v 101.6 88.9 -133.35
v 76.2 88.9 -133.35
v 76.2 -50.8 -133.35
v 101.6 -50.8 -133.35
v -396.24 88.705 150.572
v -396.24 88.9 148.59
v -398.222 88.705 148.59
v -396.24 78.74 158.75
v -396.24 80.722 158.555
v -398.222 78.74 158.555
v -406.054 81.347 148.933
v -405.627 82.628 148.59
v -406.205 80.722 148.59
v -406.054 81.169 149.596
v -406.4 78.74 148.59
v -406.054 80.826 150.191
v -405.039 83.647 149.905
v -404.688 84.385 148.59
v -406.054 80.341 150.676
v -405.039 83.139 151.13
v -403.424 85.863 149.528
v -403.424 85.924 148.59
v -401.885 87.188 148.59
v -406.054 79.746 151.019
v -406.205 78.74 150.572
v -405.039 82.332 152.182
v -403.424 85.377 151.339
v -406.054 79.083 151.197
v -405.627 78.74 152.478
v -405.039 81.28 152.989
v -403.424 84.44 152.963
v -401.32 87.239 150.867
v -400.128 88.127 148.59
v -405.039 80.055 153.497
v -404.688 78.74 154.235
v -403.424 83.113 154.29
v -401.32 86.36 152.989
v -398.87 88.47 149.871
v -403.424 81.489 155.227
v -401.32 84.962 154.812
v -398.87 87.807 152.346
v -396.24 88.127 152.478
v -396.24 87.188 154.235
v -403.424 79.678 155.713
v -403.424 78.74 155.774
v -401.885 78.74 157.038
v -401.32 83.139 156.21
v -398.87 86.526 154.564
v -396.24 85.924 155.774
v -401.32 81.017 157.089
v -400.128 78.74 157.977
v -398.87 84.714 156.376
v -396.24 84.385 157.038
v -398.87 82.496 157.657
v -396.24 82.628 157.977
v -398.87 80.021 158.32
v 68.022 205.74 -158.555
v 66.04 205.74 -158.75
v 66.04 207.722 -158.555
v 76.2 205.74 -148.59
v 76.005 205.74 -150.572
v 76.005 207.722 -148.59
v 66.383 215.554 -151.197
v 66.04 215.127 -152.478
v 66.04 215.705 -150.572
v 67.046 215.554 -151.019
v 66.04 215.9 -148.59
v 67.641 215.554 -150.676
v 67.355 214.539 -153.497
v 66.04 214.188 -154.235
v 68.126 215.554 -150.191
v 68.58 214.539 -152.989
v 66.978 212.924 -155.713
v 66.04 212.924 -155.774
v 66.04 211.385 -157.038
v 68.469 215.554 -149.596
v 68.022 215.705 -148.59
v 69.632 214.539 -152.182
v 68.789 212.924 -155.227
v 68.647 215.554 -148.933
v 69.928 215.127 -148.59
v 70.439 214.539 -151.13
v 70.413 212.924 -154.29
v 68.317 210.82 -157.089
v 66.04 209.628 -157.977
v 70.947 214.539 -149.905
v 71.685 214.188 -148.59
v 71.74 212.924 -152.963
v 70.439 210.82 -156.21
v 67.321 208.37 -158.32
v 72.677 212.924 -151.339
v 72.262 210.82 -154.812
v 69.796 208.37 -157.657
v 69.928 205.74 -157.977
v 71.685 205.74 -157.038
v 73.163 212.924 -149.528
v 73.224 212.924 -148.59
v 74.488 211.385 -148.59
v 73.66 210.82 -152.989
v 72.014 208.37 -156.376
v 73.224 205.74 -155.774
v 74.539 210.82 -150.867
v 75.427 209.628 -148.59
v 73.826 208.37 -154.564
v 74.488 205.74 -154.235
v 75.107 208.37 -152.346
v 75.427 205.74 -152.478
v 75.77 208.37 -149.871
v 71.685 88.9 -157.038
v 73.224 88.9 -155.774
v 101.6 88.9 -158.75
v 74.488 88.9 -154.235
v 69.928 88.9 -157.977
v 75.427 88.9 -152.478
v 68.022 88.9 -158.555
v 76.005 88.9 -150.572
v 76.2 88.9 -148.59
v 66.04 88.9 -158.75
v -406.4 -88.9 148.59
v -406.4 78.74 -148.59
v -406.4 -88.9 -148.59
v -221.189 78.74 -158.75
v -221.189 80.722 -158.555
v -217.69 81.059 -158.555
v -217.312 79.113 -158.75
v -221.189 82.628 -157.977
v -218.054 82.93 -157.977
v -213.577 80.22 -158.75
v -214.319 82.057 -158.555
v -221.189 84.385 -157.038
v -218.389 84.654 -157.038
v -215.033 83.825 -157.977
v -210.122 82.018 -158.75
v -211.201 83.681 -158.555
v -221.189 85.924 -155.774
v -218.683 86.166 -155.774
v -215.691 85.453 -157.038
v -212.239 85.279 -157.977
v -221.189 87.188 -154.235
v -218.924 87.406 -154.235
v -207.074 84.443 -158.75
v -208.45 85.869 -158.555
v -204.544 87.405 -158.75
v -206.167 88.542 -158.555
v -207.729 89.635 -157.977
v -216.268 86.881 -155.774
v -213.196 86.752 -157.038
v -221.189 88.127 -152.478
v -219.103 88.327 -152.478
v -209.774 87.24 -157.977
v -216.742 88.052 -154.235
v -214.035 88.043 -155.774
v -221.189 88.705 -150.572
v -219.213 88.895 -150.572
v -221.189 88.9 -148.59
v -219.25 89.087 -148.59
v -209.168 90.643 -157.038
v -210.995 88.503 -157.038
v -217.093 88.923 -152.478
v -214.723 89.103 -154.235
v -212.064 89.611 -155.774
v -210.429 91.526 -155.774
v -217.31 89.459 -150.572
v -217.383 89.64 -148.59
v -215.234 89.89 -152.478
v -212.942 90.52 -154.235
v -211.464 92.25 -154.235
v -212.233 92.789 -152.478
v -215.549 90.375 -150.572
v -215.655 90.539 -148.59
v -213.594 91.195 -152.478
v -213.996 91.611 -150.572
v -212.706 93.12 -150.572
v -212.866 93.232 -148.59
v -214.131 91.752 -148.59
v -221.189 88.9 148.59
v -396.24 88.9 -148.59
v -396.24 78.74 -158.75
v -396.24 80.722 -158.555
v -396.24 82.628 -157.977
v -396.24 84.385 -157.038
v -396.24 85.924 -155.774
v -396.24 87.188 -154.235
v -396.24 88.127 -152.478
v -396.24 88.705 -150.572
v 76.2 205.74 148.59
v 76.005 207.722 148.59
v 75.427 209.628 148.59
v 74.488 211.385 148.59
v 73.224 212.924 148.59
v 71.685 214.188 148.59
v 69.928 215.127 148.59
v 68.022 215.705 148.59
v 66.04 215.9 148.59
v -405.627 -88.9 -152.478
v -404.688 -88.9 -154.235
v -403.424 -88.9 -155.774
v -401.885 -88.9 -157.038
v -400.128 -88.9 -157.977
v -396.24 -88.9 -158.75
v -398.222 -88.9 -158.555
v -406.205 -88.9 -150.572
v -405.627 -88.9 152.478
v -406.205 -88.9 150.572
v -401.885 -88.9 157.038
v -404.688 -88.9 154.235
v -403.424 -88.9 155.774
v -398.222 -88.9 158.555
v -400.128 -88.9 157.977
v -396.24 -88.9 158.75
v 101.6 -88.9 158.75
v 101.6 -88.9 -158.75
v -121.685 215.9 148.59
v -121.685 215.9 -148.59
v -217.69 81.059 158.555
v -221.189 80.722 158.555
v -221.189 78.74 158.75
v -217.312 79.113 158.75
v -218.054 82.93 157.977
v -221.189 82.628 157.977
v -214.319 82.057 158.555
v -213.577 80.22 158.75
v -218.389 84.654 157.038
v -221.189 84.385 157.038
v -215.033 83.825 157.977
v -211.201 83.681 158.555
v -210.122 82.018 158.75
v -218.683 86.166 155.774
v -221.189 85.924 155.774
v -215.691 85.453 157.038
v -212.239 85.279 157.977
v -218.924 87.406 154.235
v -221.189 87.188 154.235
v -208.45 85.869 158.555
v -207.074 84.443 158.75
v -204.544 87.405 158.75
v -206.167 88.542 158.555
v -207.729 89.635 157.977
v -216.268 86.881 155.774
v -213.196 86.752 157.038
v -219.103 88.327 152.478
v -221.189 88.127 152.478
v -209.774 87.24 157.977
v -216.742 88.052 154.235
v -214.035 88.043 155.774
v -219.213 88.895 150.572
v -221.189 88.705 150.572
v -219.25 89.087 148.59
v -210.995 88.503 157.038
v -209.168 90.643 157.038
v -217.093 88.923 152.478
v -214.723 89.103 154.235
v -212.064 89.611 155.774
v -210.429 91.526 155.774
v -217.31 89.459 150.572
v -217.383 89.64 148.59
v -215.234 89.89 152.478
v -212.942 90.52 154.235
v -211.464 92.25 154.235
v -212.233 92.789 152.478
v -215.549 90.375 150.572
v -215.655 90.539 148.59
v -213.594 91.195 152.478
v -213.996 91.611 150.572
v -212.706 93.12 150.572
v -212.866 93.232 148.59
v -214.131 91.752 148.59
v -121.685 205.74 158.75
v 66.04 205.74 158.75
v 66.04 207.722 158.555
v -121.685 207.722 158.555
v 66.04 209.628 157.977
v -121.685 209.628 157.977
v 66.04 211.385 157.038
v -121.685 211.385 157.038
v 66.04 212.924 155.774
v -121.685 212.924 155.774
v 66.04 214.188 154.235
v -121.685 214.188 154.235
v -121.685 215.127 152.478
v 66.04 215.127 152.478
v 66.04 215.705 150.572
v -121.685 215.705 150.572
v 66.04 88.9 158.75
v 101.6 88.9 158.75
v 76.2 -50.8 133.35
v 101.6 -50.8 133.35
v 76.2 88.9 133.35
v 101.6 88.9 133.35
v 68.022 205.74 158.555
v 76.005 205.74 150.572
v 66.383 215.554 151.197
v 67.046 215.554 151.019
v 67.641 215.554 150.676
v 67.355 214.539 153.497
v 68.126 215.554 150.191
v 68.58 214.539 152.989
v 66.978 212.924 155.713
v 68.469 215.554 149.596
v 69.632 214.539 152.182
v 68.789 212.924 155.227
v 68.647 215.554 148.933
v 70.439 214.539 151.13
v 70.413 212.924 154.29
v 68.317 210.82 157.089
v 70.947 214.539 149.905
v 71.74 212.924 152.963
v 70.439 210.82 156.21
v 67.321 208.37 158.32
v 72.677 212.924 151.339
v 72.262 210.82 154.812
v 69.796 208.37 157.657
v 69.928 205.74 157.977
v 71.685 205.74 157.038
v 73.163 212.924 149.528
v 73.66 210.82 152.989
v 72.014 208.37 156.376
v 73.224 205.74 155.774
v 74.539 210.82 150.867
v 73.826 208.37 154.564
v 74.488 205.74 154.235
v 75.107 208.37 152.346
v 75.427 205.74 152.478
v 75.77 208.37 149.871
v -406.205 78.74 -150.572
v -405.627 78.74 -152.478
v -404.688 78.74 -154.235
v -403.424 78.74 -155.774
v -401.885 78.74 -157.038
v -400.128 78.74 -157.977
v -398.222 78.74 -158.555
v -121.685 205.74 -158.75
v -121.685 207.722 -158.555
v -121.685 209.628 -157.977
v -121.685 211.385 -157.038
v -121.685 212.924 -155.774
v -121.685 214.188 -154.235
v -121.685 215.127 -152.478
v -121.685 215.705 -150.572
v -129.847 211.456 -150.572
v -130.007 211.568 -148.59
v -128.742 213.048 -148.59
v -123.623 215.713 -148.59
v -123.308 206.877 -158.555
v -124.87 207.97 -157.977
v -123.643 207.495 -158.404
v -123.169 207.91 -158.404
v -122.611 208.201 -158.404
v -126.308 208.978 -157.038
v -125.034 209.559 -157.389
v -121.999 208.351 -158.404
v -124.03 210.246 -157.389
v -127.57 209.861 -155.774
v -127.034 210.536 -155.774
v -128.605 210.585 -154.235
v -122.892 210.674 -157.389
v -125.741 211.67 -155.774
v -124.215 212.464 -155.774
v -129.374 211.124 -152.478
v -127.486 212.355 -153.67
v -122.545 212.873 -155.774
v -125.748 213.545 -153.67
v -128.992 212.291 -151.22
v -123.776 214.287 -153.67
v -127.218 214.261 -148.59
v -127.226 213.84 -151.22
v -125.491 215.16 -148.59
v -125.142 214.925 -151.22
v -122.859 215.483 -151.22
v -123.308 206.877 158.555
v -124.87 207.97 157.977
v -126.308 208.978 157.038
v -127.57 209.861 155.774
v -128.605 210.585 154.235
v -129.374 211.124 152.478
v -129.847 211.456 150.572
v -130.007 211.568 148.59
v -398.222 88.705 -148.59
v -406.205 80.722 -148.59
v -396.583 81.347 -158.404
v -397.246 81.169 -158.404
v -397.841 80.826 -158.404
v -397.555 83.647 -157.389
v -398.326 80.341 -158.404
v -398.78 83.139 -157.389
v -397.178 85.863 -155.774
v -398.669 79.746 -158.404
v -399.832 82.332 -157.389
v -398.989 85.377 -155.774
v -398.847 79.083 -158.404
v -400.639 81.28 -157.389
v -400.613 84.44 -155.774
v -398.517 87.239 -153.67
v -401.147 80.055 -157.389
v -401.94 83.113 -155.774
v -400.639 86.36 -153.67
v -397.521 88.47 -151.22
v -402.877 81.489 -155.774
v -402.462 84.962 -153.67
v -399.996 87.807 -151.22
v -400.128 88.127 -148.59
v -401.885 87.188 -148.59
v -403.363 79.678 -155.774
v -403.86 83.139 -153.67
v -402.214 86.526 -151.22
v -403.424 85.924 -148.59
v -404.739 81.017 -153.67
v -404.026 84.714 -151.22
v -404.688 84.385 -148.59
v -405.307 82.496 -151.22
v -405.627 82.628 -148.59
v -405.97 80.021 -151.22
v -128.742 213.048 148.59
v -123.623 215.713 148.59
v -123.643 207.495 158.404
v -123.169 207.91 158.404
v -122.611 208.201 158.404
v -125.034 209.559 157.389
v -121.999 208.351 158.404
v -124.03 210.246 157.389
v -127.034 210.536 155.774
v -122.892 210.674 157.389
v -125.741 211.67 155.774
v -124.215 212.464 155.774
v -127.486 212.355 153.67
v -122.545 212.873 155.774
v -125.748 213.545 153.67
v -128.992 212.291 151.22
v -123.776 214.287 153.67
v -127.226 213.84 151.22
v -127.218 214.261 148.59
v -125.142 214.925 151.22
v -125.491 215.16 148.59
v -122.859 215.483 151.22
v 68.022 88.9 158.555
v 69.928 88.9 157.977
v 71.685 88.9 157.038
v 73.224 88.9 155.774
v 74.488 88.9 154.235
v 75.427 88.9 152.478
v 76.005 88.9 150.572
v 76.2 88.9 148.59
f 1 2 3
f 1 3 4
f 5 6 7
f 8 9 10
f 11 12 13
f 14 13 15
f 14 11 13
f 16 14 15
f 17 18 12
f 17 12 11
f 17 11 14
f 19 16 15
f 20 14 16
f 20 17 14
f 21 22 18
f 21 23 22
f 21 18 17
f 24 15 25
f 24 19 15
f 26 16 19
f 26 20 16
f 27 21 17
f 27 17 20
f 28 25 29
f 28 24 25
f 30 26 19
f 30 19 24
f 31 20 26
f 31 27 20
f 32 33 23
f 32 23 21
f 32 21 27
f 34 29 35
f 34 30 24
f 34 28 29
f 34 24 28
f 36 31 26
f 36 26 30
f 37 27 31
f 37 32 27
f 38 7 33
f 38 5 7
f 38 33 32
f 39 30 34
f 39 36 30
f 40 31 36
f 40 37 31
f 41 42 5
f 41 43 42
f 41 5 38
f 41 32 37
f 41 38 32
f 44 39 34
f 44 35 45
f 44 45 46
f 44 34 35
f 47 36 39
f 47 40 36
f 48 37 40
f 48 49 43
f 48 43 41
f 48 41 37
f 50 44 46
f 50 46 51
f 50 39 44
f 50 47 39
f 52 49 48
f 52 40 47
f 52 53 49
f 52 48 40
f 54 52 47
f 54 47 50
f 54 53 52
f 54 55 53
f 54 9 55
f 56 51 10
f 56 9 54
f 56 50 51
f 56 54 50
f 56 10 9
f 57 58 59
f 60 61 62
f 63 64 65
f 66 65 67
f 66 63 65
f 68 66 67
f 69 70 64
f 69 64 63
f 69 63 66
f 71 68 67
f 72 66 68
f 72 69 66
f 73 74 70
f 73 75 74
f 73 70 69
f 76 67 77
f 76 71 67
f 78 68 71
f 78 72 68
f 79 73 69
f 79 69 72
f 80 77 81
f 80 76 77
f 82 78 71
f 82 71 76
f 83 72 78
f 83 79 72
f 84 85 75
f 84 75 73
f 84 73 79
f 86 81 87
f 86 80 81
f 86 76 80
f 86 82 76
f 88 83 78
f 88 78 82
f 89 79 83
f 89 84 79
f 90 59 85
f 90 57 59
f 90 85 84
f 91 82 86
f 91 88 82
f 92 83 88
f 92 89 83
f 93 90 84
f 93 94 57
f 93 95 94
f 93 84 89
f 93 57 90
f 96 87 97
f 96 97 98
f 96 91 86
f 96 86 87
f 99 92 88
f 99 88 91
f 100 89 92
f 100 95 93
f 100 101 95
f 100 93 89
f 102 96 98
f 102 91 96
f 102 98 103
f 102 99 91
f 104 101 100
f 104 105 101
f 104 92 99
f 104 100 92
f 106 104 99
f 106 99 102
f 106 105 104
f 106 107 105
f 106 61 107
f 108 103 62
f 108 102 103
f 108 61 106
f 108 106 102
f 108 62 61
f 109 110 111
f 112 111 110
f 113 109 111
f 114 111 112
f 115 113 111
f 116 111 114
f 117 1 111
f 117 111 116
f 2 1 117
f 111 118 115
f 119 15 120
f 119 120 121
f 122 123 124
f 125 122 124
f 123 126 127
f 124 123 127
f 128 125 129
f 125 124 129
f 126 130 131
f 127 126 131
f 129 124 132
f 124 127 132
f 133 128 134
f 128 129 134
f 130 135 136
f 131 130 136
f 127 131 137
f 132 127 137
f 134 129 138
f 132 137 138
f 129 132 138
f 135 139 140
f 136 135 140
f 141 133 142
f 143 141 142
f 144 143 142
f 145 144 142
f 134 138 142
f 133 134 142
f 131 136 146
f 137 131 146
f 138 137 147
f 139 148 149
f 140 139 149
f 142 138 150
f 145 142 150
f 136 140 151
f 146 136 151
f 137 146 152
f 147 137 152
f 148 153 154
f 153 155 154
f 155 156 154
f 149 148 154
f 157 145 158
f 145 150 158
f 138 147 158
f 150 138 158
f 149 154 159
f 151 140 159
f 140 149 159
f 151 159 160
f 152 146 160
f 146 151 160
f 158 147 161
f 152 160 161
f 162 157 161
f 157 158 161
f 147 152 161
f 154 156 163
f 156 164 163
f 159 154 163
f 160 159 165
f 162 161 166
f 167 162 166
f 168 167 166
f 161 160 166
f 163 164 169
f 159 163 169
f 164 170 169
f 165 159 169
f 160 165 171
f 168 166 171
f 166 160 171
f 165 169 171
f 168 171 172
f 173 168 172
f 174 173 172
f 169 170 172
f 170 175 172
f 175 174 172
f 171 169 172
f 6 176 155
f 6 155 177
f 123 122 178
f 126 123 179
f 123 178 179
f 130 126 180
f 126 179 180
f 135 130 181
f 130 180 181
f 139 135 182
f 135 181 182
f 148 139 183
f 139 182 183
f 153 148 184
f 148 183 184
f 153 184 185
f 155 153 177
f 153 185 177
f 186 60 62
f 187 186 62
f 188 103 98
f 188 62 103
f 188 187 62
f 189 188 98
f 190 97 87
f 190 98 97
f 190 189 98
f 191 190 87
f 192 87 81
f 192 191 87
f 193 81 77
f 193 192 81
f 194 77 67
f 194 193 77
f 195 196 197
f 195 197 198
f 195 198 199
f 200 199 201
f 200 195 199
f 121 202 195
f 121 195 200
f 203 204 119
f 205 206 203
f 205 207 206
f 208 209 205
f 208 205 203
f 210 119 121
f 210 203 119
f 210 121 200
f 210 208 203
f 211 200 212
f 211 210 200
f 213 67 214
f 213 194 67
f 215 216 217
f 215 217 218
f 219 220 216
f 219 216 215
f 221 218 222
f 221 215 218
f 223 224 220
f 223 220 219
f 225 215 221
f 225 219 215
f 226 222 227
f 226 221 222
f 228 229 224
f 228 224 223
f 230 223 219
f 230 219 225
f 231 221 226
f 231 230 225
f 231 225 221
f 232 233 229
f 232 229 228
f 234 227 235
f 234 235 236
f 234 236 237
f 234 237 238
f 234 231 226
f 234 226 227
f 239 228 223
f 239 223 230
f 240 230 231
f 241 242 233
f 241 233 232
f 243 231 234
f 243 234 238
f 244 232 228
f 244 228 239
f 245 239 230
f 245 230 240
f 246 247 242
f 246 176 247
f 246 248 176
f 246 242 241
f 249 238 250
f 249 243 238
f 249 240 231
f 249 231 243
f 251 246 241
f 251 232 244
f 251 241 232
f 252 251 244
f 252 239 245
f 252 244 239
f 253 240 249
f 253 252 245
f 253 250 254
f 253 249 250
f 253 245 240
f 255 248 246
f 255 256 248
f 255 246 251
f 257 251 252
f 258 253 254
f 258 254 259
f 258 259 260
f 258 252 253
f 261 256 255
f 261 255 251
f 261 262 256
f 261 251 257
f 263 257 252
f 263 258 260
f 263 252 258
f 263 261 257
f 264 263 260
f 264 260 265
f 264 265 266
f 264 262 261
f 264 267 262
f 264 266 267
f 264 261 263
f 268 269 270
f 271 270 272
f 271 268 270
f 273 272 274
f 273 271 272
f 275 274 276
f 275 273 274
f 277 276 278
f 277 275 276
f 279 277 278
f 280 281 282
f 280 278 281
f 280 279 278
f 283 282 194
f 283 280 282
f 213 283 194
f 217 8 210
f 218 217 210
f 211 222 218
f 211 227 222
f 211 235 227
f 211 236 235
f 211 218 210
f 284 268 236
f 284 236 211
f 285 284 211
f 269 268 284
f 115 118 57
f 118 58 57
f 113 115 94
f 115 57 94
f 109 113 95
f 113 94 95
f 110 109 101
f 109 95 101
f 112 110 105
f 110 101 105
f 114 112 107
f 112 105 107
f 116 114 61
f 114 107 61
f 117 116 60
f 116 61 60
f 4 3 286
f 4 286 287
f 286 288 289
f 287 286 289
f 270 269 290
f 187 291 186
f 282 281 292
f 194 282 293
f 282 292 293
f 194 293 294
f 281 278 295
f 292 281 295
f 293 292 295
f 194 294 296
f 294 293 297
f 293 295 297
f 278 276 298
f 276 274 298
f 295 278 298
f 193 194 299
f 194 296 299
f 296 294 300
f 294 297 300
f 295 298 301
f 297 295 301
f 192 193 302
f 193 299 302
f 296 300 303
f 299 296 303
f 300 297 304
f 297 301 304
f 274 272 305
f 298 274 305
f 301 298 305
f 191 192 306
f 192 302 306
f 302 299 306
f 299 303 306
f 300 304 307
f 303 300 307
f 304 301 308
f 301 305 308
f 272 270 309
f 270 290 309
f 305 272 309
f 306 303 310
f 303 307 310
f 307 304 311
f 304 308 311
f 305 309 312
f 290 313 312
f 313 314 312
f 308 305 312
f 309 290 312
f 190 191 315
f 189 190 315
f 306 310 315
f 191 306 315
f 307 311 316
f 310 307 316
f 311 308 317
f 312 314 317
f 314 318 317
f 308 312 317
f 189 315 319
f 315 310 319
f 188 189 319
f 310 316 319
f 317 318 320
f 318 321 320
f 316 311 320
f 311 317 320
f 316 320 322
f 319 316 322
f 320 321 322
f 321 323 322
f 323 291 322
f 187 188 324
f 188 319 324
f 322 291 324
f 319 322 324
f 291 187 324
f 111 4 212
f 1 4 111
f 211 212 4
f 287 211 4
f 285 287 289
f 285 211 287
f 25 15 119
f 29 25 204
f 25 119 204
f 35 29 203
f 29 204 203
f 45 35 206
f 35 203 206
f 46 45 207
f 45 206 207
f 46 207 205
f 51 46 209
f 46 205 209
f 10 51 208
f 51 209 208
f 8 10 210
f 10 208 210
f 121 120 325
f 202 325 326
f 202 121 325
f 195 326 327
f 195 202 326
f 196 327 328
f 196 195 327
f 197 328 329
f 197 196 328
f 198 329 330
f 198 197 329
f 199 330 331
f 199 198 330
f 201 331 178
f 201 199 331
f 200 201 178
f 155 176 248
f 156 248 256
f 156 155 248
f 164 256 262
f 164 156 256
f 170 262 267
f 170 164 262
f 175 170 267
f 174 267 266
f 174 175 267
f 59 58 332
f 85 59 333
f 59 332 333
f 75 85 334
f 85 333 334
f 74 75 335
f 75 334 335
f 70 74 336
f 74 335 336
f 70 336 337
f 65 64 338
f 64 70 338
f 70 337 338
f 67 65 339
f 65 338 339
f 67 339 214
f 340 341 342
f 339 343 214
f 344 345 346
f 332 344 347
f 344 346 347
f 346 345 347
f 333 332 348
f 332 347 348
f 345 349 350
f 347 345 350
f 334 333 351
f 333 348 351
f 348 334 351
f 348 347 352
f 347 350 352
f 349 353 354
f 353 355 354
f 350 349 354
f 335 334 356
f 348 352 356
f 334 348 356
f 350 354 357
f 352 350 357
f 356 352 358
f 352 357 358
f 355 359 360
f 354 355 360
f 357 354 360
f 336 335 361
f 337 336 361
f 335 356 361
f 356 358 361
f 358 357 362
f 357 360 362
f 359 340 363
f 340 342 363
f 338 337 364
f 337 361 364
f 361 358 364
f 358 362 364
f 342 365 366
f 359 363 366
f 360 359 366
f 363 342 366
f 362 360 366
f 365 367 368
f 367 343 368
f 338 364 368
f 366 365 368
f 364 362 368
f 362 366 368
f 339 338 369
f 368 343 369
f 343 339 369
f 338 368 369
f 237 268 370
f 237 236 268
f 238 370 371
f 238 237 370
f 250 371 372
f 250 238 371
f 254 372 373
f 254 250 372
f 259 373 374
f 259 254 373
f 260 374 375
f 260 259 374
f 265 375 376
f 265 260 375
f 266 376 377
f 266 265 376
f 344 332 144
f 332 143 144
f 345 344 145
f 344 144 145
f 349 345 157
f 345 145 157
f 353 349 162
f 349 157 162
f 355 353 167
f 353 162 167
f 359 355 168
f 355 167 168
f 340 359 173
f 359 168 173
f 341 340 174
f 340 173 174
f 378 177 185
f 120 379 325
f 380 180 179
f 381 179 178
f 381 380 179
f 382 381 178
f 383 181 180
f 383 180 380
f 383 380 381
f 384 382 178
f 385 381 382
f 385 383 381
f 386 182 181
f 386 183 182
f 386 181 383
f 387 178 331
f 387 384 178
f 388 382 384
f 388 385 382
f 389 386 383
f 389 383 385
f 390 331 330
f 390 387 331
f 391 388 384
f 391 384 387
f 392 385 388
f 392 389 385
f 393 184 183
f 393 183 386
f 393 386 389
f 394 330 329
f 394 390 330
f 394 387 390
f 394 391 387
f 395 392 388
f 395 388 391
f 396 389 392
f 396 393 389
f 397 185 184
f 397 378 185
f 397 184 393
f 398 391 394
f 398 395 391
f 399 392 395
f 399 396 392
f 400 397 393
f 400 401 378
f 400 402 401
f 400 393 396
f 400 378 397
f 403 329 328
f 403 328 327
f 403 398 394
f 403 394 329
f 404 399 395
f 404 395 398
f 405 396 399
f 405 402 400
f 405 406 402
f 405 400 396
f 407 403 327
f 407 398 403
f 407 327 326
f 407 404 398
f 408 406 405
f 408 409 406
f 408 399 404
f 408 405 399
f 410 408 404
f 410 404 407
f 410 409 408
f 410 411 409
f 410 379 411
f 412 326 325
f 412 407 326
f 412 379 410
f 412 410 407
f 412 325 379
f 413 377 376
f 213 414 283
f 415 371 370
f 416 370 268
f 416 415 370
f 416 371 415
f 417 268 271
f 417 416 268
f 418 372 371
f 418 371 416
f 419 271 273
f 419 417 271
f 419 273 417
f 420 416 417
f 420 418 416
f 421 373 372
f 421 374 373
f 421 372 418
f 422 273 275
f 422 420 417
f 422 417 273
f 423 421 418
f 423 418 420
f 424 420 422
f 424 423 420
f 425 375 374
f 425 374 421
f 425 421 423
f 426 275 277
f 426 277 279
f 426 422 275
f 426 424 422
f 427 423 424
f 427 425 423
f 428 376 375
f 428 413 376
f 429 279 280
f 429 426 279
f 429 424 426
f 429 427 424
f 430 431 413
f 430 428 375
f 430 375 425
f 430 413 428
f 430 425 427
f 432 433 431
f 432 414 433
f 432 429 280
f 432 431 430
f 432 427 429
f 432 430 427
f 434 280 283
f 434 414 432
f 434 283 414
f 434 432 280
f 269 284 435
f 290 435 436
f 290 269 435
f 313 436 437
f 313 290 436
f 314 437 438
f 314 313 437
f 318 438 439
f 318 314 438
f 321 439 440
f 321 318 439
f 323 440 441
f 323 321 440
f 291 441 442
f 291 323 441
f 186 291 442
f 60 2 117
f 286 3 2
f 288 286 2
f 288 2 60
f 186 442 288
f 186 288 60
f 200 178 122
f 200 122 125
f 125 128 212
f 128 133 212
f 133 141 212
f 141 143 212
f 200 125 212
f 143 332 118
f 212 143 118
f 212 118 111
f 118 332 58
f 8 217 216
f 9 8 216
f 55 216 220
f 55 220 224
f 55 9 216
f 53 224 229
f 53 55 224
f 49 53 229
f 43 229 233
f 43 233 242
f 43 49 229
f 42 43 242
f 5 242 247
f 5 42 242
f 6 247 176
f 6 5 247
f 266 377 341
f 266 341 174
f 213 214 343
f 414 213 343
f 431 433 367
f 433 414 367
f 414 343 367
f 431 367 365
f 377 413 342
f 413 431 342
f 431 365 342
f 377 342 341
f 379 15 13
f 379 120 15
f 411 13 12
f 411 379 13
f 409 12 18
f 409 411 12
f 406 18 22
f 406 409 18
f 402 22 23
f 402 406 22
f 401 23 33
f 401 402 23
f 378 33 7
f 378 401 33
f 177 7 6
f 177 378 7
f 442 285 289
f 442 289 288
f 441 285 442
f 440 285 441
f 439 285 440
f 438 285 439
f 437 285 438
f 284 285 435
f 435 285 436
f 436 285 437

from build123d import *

# Parameters (mm, degrees)
BOSS_EXTRUDE1_DEPTH = 158.75
SKETCH2_W           = 25.4
SKETCH2_H           = 266.7
CUT_EXTRUDE1_DEPTH  = 139.7
FILLET1_R           = 10.16


with BuildPart() as part:
    # Sketch1 → Boss-Extrude1 (new, symmetric)
    with BuildSketch(Plane.XY):
        Polygon((-406.4, 88.9), (-406.4, -88.9), (101.6, -88.9), (101.6, 88.9), (76.2, 88.9), (76.2, 215.9), (-126.973642647, 215.9), (-215.9, 88.9), align=None)
    extrude(amount=BOSS_EXTRUDE1_DEPTH, both=True)

    # Sketch2 → Cut-Extrude1 (cut)
    with BuildSketch(Plane(origin=(0, 88.9, 0), x_dir=(1, 0, 0), z_dir=(0, 1, 0))):
        with Locations((88.9, 0)):
            Rectangle(SKETCH2_W, SKETCH2_H)
    extrude(amount=-CUT_EXTRUDE1_DEPTH, mode=Mode.SUBTRACT)

    # Fillet1
    fillet1_edges = [part.edges().sort_by_distance(p)[0] for p in [
        (-171.436821324, 152.4, 158.75),
        (-171.436821324, 152.4, -158.75),
        (-215.9, 88.9, 0),
        (-311.15, 88.9, 158.75),
        (-406.4, 88.9, 0),
        (-311.15, 88.9, -158.75),
        (76.2, 152.4, -158.75),
        (76.2, 152.4, 158.75),
        (-25.386821324, 215.9, -158.75),
        (-25.386821324, 215.9, 158.75),
        (76.2, 215.9, 0),
        (-126.973642647, 215.9, 0),
        (-406.4, 0, -158.75),
        (-406.4, 0, 158.75),
    ]]
    fillet(fillet1_edges, radius=FILLET1_R)


solid = part.part
